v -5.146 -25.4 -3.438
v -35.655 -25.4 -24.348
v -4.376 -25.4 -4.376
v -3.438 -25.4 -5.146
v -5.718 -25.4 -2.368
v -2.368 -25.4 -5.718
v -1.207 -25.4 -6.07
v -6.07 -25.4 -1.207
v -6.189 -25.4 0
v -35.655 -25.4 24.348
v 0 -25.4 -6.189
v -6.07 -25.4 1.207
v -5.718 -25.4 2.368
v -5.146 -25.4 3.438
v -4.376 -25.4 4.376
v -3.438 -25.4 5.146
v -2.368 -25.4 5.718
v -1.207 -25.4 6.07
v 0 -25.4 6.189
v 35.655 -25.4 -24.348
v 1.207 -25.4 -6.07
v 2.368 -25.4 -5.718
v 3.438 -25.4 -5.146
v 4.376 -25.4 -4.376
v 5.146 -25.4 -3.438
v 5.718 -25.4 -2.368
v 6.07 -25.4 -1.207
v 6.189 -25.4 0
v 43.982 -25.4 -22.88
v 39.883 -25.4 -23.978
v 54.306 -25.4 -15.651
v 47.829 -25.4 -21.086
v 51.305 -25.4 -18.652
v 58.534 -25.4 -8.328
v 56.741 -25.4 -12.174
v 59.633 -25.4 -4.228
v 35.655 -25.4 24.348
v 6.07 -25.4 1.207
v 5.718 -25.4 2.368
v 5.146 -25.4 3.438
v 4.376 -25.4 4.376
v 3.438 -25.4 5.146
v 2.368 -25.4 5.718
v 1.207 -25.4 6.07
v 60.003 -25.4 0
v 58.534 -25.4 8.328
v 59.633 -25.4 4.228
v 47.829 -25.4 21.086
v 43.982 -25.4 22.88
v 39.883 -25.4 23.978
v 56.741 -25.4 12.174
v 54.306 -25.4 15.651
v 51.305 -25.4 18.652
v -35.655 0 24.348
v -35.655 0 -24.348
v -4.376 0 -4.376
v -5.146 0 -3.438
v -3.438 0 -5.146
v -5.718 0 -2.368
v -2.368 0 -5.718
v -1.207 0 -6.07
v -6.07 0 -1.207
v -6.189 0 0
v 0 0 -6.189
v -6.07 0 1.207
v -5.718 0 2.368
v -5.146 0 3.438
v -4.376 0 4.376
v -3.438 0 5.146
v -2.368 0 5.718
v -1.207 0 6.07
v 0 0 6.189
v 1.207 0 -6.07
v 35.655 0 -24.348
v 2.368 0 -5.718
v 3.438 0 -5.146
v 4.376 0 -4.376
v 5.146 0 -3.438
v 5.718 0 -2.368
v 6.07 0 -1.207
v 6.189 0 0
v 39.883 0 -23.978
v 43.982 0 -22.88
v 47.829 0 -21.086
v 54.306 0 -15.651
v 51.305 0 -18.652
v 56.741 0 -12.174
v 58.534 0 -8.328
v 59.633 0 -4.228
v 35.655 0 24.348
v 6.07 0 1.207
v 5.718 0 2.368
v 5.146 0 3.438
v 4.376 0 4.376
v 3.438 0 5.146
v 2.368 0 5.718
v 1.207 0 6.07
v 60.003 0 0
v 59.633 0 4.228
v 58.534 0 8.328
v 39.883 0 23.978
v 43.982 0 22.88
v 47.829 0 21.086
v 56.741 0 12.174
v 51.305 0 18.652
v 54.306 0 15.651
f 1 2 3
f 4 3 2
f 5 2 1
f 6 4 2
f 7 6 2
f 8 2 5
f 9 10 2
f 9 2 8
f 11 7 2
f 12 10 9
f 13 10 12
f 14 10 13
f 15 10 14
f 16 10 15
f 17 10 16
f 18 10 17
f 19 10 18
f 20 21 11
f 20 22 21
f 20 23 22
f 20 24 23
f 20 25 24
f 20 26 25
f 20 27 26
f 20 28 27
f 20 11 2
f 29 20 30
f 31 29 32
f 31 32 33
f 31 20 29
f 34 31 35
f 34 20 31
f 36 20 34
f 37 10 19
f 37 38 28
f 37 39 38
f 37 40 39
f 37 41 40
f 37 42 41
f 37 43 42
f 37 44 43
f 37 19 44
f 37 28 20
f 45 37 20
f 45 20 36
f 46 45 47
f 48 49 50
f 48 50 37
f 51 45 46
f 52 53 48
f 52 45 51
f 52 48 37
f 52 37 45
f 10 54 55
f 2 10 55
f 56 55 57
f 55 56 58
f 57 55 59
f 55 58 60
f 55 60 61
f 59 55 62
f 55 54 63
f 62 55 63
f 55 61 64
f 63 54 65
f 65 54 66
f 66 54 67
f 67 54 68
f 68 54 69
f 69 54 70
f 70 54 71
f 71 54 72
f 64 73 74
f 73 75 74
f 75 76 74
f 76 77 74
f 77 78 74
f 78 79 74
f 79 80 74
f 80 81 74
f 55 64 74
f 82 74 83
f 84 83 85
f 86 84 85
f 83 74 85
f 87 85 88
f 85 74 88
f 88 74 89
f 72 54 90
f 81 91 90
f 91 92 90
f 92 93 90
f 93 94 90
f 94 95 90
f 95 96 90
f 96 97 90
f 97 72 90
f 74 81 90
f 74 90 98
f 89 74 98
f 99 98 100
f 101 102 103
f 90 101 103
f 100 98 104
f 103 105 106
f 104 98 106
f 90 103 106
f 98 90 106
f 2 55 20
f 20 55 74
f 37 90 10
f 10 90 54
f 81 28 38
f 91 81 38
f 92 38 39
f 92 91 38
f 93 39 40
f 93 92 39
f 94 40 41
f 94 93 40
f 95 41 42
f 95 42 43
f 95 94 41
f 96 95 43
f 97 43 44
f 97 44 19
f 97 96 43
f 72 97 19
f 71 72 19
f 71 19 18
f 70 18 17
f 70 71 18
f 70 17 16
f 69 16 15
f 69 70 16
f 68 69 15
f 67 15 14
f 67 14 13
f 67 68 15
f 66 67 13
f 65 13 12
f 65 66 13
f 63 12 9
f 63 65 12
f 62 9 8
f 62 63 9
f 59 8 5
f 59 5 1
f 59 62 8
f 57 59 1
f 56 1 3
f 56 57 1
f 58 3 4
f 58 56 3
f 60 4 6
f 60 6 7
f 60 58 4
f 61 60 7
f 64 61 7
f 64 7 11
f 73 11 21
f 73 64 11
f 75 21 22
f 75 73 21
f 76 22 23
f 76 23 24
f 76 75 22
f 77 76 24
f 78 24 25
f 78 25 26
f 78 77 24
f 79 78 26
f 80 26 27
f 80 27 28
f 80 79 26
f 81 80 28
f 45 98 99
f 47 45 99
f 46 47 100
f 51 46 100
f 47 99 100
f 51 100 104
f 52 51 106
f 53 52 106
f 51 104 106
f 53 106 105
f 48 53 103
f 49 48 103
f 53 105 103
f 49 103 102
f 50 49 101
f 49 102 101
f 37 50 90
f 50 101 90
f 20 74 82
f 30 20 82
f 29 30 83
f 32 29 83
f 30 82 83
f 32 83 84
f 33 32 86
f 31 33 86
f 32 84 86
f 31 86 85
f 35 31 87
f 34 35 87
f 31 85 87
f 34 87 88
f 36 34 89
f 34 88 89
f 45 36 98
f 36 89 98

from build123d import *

# Parameters (mm, degrees)
F0_R     = 6.189108
F1_DEPTH = 25.4


with BuildPart() as f1:
    # F0 (on Front) → F1 (new body)
    with BuildSketch(Plane.XZ):
        with BuildLine():
            ThreePointArc((35.654567, -24.347987), (11.30658, 0), (35.654567, 24.347987))
            Line((35.654567, 24.347987), (-35.654567, 24.347987))
            Line((-35.654567, 24.347987), (-35.654567, -24.347987))
            Line((-35.654567, -24.347987), (35.654567, -24.347987))
        make_face()
        Circle(F0_R, mode=Mode.SUBTRACT)
        with BuildLine():
            Line((35.654567, -24.347987), (35.654567, 24.347987))
            ThreePointArc((35.654567, 24.347987), (11.30658, 0), (35.654567, -24.347987))
        make_face()
        with BuildLine():
            ThreePointArc((60.002554, 0), (52.871194, 17.216627), (35.654567, 24.347987))
            Line((35.654567, 24.347987), (35.654567, -24.347987))
            ThreePointArc((35.654567, -24.347987), (52.871194, -17.216627), (60.002554, 0))
        make_face()
    extrude(amount=F1_DEPTH)


solid = f1.part
